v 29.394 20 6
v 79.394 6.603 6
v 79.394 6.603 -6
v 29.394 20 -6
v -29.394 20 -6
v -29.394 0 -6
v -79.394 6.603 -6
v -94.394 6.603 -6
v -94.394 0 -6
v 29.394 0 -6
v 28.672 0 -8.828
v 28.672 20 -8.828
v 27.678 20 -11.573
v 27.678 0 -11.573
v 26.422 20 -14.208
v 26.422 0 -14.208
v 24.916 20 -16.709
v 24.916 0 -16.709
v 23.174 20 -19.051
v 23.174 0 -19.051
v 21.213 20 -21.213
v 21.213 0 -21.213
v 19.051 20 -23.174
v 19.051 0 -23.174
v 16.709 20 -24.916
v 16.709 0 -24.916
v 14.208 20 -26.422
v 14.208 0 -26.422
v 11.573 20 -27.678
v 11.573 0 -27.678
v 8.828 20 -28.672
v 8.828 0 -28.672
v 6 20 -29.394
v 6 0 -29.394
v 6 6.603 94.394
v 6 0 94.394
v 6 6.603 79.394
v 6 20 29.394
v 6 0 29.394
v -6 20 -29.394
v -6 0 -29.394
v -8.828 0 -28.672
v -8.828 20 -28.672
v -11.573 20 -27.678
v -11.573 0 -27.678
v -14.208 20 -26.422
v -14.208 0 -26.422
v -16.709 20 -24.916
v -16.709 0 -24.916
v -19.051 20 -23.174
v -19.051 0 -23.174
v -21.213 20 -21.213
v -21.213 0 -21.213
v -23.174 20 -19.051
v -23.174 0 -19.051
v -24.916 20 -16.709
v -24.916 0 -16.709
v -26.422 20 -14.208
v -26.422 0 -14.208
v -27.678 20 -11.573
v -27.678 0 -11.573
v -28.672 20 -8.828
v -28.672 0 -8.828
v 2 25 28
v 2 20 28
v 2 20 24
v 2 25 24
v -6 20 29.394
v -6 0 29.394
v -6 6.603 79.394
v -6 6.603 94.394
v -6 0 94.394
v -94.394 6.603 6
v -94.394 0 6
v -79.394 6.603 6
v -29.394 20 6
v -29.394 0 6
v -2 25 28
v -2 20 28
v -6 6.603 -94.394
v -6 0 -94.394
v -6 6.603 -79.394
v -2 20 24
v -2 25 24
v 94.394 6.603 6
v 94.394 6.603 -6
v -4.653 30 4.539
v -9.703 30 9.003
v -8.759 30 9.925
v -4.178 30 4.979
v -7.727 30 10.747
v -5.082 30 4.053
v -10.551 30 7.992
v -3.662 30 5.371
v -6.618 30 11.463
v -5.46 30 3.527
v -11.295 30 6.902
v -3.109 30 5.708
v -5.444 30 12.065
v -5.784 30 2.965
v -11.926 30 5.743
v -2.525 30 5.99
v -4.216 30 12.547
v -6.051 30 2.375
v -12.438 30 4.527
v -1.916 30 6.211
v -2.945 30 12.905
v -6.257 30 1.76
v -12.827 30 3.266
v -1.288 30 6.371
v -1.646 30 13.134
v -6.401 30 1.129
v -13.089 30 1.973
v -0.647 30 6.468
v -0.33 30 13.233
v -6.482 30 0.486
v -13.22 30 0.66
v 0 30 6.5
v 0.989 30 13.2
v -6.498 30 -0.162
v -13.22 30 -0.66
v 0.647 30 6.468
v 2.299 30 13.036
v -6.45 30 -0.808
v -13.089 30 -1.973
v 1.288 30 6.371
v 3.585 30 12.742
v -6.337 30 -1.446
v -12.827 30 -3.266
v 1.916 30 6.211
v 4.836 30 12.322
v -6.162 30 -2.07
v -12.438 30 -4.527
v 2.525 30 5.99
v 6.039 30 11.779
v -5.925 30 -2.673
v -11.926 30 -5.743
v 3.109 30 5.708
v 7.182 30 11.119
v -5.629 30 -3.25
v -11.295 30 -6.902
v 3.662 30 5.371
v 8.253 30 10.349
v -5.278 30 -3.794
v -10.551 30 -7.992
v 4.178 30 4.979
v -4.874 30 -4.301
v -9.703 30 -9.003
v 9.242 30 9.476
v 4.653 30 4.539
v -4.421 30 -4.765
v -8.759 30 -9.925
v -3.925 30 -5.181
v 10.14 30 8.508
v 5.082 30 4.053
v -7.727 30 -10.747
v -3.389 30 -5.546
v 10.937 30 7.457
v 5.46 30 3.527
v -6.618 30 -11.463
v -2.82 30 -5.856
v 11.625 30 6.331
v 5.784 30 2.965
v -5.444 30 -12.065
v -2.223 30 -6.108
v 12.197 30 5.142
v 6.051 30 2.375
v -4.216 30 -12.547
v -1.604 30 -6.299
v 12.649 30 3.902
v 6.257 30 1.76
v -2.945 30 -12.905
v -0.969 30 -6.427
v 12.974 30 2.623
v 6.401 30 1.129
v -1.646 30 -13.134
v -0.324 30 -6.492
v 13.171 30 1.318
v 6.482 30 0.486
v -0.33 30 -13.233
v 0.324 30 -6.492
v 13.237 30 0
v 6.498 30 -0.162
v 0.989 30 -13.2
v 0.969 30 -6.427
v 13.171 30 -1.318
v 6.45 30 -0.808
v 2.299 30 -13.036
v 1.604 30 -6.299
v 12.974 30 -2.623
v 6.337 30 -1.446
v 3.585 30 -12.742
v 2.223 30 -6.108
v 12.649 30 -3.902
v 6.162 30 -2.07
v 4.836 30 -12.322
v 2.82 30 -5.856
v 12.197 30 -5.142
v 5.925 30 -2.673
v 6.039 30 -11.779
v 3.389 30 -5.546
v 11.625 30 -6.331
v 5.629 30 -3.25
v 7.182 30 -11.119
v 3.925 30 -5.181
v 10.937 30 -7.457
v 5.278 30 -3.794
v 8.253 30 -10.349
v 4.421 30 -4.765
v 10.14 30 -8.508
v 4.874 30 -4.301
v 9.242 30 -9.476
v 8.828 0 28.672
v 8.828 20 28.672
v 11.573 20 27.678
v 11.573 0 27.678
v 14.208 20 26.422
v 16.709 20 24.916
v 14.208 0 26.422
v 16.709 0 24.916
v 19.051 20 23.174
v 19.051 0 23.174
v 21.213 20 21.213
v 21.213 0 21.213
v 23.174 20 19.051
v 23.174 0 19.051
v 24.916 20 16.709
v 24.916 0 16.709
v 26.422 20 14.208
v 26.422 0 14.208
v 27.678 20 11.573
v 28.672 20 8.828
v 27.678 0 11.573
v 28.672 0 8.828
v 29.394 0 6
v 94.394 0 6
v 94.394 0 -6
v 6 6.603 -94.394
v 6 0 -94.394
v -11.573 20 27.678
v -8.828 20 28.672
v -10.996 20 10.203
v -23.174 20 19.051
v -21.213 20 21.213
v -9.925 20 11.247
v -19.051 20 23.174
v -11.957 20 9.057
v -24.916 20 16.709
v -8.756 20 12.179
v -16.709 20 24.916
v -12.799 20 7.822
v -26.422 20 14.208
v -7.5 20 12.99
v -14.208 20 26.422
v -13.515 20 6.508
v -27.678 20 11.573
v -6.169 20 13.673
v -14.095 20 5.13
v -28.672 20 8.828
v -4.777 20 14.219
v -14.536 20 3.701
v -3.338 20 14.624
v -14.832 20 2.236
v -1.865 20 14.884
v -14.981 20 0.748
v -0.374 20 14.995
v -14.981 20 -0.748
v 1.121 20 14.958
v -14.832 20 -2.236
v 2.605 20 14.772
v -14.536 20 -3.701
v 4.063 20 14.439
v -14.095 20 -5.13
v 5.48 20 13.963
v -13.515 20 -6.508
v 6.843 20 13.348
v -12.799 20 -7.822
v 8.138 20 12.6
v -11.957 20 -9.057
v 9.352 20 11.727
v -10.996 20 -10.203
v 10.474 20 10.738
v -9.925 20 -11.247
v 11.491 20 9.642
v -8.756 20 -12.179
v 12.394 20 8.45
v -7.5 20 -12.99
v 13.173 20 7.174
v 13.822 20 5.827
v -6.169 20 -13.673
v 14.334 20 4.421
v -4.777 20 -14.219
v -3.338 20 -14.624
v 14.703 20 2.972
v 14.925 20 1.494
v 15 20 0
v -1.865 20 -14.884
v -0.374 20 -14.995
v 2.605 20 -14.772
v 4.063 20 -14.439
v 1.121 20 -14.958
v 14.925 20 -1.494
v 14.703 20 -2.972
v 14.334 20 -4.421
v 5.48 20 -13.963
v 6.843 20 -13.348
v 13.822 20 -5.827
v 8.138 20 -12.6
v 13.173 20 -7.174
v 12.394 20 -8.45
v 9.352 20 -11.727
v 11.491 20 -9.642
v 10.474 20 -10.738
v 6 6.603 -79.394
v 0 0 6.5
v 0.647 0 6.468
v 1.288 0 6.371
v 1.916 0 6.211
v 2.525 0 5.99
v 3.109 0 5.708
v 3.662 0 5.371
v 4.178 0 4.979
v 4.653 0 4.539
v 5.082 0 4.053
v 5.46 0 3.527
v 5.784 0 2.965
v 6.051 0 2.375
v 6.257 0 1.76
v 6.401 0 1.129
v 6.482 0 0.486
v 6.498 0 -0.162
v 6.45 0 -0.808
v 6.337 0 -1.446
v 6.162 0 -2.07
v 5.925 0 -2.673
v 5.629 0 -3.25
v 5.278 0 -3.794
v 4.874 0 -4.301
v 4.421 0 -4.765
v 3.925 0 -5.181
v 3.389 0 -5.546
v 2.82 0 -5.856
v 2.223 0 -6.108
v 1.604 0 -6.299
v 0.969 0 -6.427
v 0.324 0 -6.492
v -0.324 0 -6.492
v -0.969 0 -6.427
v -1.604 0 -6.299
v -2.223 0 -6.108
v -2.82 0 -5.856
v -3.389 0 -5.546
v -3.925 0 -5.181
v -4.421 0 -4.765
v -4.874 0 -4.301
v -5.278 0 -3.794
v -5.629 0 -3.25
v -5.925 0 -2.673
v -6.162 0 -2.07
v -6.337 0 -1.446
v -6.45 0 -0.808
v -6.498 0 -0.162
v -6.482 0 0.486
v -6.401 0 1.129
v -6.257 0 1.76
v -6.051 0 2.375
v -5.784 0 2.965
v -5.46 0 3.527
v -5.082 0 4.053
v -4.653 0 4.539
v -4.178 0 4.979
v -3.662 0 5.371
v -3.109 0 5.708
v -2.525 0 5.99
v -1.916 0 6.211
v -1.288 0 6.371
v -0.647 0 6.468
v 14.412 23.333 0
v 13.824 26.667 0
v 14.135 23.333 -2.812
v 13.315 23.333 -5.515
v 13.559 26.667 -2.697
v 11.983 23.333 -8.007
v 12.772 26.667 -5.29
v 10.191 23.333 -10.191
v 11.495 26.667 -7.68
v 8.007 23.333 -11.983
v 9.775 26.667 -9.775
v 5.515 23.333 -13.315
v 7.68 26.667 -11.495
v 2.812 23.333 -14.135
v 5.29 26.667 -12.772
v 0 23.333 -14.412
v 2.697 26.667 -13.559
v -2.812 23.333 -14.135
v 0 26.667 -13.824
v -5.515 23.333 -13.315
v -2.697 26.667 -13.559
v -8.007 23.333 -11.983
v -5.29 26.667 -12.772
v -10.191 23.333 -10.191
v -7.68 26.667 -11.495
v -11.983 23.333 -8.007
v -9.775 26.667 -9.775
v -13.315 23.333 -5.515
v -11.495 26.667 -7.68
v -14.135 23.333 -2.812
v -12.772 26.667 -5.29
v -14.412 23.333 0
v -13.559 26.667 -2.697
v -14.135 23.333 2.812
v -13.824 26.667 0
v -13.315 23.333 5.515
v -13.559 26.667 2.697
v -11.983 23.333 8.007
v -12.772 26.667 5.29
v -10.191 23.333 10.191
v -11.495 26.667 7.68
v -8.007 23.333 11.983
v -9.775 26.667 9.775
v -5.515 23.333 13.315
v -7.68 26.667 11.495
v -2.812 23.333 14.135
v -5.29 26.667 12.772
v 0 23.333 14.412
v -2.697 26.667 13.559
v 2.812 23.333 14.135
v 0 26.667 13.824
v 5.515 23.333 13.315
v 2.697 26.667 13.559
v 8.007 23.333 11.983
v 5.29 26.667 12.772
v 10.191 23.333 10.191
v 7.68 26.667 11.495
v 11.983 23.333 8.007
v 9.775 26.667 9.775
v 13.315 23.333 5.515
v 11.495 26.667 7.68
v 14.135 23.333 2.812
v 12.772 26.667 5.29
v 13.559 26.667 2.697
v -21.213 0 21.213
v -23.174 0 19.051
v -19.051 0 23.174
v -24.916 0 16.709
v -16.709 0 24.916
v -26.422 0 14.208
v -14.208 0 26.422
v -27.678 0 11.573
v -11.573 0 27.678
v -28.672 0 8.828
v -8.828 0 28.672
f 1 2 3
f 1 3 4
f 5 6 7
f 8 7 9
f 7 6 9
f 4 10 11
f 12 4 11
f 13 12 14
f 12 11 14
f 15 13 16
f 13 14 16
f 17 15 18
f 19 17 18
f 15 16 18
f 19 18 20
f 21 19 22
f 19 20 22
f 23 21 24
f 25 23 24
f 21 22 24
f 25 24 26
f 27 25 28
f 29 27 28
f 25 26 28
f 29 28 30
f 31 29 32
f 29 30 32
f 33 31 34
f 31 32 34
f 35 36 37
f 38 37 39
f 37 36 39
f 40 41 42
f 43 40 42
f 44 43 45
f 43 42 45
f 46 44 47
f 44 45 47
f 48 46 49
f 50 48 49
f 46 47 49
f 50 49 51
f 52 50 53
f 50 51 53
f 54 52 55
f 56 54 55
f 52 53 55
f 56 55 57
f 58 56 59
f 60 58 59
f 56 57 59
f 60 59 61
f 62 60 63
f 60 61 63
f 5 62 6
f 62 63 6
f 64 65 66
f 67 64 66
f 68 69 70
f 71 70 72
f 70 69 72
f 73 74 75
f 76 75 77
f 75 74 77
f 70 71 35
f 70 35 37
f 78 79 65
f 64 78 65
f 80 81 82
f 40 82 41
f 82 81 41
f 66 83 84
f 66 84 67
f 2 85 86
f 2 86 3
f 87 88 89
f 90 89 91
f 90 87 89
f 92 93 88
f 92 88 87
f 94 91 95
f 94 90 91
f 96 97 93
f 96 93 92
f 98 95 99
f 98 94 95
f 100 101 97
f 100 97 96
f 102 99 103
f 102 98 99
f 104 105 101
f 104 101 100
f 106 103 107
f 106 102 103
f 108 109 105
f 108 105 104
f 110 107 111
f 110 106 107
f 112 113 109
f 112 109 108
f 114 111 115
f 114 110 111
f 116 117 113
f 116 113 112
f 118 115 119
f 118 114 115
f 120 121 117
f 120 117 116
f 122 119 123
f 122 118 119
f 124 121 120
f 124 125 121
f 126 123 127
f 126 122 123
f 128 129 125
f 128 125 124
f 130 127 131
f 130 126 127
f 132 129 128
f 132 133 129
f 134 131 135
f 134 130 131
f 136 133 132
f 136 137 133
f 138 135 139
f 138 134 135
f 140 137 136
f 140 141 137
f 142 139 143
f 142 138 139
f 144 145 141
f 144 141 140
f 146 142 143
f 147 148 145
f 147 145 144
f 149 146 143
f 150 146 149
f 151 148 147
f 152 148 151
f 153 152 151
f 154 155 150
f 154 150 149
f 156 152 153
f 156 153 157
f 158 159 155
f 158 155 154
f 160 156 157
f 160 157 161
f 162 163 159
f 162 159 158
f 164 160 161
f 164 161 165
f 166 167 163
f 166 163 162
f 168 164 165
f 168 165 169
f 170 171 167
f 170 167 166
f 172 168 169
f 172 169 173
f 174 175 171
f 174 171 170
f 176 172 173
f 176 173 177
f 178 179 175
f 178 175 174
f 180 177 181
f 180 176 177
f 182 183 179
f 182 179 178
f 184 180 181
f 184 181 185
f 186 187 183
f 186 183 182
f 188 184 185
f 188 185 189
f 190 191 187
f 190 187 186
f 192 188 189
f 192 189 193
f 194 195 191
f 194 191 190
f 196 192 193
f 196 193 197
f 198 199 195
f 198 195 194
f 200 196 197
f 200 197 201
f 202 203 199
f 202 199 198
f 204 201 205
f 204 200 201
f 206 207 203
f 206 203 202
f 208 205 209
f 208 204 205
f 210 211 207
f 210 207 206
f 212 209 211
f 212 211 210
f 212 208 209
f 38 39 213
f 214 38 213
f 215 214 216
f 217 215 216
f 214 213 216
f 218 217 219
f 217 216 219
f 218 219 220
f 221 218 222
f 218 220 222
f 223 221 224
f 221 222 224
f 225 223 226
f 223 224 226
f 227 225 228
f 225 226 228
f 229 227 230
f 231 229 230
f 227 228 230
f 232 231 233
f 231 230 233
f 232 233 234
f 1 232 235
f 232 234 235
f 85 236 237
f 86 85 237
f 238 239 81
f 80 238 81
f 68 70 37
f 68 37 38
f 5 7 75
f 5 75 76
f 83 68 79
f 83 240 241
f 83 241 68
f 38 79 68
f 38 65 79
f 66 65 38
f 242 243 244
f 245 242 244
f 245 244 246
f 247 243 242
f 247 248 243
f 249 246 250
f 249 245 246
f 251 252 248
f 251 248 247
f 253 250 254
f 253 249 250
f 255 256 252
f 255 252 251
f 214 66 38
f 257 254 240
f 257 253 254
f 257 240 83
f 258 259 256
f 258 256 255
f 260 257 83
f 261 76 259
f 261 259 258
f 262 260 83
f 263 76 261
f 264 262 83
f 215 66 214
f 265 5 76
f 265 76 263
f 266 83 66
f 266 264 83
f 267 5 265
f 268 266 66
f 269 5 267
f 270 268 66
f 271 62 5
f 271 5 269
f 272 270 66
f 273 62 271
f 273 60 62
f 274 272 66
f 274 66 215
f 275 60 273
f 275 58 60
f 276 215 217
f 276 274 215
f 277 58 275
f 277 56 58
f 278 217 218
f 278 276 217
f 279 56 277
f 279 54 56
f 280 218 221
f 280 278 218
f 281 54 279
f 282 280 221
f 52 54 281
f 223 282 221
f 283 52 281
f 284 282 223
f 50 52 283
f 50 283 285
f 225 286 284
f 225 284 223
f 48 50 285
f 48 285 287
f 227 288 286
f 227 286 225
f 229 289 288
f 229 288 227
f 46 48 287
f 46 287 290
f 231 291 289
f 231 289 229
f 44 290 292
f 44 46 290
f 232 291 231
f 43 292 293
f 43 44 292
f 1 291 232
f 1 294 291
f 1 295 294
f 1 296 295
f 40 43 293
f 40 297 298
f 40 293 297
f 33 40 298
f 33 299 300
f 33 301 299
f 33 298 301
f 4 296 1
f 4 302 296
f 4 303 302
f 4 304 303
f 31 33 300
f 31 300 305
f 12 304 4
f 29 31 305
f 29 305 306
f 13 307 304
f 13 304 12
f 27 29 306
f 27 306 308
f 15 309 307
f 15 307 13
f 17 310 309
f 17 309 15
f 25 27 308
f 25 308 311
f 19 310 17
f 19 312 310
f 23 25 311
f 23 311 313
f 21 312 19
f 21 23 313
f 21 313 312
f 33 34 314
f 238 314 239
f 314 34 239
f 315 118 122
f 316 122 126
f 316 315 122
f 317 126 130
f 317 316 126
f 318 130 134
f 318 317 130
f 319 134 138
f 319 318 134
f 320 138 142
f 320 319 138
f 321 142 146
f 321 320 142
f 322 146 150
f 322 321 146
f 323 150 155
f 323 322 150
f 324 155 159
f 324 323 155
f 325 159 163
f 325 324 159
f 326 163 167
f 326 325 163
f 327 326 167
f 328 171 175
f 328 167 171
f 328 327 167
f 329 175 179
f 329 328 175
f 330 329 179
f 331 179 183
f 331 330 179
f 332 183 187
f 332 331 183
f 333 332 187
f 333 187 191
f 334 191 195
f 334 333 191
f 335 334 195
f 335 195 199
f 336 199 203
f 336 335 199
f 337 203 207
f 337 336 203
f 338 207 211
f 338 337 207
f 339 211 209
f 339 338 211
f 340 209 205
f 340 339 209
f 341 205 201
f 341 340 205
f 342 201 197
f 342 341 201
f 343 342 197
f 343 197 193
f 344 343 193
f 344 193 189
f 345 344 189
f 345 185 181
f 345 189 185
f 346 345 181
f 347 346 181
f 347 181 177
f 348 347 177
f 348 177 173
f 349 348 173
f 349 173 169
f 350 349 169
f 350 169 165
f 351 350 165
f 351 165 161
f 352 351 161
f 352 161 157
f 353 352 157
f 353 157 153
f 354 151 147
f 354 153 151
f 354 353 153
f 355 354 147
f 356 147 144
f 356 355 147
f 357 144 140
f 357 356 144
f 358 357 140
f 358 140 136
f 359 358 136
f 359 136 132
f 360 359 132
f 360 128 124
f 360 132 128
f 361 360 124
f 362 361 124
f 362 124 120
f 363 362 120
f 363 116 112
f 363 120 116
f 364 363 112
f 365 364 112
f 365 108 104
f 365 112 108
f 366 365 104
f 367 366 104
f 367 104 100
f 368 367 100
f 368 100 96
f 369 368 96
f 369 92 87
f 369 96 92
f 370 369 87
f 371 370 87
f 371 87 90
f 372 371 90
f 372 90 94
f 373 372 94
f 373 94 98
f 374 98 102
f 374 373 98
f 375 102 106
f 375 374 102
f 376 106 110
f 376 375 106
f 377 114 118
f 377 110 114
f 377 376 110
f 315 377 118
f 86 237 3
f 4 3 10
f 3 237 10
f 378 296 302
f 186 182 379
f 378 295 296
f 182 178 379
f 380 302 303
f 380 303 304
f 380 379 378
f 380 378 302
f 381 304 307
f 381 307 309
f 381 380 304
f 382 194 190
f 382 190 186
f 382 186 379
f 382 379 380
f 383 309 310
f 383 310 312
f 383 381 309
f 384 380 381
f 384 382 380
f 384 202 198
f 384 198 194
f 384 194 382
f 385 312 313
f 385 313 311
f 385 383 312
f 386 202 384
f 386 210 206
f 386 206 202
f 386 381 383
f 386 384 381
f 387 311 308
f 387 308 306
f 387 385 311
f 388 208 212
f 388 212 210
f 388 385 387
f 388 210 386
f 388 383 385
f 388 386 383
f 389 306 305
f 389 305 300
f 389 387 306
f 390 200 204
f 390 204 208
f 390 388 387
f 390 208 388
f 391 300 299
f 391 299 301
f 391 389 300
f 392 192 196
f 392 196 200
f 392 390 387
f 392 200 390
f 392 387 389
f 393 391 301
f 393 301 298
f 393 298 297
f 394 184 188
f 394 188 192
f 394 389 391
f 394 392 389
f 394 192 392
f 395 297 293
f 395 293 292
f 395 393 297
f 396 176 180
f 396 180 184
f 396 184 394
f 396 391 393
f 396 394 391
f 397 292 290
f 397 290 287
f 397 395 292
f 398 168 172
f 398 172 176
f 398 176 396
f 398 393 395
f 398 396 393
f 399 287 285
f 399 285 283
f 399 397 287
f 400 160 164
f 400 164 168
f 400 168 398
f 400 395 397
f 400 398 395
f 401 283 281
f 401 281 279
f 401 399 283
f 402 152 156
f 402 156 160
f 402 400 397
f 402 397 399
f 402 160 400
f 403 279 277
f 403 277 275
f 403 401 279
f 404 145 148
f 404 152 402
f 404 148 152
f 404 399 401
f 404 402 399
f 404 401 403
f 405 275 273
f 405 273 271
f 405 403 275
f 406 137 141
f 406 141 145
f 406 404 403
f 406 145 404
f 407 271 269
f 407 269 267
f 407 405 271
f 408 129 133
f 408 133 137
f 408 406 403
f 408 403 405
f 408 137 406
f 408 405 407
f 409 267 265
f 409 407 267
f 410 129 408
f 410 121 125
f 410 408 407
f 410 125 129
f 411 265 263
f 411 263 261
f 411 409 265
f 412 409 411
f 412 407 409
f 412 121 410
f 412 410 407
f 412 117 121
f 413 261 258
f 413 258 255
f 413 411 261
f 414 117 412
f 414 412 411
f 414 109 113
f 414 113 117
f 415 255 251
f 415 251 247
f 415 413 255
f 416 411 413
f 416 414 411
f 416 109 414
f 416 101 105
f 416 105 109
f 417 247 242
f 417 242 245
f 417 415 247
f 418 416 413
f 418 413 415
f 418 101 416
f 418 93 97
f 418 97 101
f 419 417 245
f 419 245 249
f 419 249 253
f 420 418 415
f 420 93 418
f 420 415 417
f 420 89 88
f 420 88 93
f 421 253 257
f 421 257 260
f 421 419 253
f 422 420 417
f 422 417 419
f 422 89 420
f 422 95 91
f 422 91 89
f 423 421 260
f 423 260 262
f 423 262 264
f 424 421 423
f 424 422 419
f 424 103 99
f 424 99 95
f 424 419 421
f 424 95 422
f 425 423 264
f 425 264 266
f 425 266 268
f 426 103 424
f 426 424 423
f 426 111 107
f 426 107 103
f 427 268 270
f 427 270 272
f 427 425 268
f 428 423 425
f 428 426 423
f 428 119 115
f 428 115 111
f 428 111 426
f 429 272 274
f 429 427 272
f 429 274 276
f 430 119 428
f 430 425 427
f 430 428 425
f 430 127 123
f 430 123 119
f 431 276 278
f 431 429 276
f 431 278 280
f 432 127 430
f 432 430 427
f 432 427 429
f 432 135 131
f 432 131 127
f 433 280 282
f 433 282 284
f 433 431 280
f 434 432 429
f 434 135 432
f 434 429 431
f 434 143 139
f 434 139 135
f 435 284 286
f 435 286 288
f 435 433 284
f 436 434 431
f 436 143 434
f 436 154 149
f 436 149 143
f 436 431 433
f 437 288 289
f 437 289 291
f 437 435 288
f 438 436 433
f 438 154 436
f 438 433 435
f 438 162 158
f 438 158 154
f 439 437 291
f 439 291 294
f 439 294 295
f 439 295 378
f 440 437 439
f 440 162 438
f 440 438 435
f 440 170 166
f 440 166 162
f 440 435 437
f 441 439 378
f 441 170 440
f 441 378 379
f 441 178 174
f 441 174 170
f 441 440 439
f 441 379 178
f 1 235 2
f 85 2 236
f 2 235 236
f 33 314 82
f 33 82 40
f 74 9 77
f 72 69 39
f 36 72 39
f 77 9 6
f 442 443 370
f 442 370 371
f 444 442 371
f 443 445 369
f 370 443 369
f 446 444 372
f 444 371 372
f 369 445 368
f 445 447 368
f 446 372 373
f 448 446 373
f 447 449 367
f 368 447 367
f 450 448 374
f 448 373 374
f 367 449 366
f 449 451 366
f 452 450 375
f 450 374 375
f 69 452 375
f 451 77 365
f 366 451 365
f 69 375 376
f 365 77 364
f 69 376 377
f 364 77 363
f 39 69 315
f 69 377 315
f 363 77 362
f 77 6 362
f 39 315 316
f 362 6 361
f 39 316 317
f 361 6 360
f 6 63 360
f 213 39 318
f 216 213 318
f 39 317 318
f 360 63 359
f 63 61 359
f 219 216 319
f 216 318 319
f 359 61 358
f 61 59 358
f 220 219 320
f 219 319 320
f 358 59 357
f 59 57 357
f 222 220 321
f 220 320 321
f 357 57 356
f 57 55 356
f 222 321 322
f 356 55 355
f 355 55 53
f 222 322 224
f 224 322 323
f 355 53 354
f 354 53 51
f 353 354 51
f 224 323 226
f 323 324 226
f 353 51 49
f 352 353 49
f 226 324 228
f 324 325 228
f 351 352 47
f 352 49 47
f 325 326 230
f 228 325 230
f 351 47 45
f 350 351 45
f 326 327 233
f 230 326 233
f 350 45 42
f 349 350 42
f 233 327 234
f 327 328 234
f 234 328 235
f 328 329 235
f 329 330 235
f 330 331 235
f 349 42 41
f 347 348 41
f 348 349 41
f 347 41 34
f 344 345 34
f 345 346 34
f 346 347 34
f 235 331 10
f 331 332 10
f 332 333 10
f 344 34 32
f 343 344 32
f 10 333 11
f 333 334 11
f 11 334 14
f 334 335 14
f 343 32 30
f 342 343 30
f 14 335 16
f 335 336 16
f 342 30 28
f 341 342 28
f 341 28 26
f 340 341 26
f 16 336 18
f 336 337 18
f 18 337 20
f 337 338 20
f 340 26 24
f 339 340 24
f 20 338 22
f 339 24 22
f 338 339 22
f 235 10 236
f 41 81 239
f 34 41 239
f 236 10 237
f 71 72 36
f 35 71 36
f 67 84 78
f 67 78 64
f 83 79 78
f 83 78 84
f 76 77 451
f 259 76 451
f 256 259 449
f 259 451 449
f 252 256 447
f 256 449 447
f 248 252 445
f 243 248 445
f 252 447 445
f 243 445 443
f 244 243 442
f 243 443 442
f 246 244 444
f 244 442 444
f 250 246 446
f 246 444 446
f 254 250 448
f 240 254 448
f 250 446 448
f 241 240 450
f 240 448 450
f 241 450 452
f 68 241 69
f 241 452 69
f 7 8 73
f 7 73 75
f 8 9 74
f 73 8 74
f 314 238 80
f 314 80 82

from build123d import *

# Parameters (mm, degrees)
SKETCH1_R           = 30
BASE_DEPTH          = 20
BOSS_EXTRUDE1_DEPTH = 20
CUT_EXTRUDE1_DEPTH  = 37
CIRPATTERN1_COUNT   = 4
BOSS_EXTRUDE2_START = 20
SKETCH1_10_R        = 15
BOSS_EXTRUDE2_DEPTH = 10
BOSS_EXTRUDE2_TAPER = 10
SKETCH1_11_R        = 6.5
CUT_EXTRUDE2_DEPTH  = 31.0000001
SKETCH1_12_W        = 4
SKETCH1_12_H        = 4
BOSS_EXTRUDE3_DEPTH = 25


with BuildPart() as part:
    # Sketch1 → Base (new body)
    with BuildSketch(Plane(origin=(0, 0, 0), x_dir=(1, 0, 0), z_dir=(0, 1, 0))):
        with Locations(Location((0, 0, 0), (0, 0, 270))):  # turned: the seam where the file's is
            Circle(SKETCH1_R)
    extrude(amount=BASE_DEPTH)

    # Sketch1_8 → Boss-Extrude1 (add)
    with BuildSketch(Plane(origin=(0, 0, 0), x_dir=(1, 0, 0), z_dir=(0, 1, 0))):
        with BuildLine():
            ThreePointArc((6, -29.393876913), (0, -30), (-6, -29.393876913))
            Line((-6, -29.393876913), (-6, -94.393876913))
            Line((-6, -94.393876913), (6, -94.393876913))
            Line((6, -94.393876913), (6, -29.393876913))
        make_face()
    boss_extrude1 = extrude(amount=BOSS_EXTRUDE1_DEPTH)

    # Sketch2 → Cut-Extrude1 (cut, through all)
    with BuildSketch(Plane.ZY.offset(6)):
        Polygon((29.393876913, 20), (94.393876913, 20), (94.393876913, 6.602540378), (79.393876913, 6.602540378), align=None)
    cut_extrude1 = extrude(amount=-CUT_EXTRUDE1_DEPTH, mode=Mode.SUBTRACT)

    # CirPattern1: Boss-Extrude1, Cut-Extrude1 ×4 about axis
    cirpattern1_axis = Axis((0, 0, 0), (0, 1, 0))
    add([boss_extrude1.rotate(cirpattern1_axis, i * 360 / CIRPATTERN1_COUNT) for i in range(1, CIRPATTERN1_COUNT)])
    add([cut_extrude1.rotate(cirpattern1_axis, i * 360 / CIRPATTERN1_COUNT) for i in range(1, CIRPATTERN1_COUNT)], mode=Mode.SUBTRACT)

    # Sketch1_10 → Boss-Extrude2 (add)
    with BuildSketch(Plane(origin=(0, 0, 0), x_dir=(1, 0, 0), z_dir=(0, 1, 0)).offset(BOSS_EXTRUDE2_START)):
        Circle(SKETCH1_10_R)
    extrude(amount=BOSS_EXTRUDE2_DEPTH, taper=BOSS_EXTRUDE2_TAPER)

    # Sketch1_11 → Cut-Extrude2 (cut, through all)
    with BuildSketch(Plane(origin=(0, 0, 0), x_dir=(1, 0, 0), z_dir=(0, 1, 0))):
        with Locations(Location((0, 0, 0), (0, 0, 270))):  # turned: the seam where the file's is
            Circle(SKETCH1_11_R)
    extrude(amount=CUT_EXTRUDE2_DEPTH, mode=Mode.SUBTRACT)

    # Sketch1_12 → Boss-Extrude3 (add)
    with BuildSketch(Plane(origin=(0, 0, 0), x_dir=(1, 0, 0), z_dir=(0, 1, 0))):
        with Locations((0, -26)):
            Rectangle(SKETCH1_12_W, SKETCH1_12_H)
    extrude(amount=BOSS_EXTRUDE3_DEPTH)


solid = part.part
